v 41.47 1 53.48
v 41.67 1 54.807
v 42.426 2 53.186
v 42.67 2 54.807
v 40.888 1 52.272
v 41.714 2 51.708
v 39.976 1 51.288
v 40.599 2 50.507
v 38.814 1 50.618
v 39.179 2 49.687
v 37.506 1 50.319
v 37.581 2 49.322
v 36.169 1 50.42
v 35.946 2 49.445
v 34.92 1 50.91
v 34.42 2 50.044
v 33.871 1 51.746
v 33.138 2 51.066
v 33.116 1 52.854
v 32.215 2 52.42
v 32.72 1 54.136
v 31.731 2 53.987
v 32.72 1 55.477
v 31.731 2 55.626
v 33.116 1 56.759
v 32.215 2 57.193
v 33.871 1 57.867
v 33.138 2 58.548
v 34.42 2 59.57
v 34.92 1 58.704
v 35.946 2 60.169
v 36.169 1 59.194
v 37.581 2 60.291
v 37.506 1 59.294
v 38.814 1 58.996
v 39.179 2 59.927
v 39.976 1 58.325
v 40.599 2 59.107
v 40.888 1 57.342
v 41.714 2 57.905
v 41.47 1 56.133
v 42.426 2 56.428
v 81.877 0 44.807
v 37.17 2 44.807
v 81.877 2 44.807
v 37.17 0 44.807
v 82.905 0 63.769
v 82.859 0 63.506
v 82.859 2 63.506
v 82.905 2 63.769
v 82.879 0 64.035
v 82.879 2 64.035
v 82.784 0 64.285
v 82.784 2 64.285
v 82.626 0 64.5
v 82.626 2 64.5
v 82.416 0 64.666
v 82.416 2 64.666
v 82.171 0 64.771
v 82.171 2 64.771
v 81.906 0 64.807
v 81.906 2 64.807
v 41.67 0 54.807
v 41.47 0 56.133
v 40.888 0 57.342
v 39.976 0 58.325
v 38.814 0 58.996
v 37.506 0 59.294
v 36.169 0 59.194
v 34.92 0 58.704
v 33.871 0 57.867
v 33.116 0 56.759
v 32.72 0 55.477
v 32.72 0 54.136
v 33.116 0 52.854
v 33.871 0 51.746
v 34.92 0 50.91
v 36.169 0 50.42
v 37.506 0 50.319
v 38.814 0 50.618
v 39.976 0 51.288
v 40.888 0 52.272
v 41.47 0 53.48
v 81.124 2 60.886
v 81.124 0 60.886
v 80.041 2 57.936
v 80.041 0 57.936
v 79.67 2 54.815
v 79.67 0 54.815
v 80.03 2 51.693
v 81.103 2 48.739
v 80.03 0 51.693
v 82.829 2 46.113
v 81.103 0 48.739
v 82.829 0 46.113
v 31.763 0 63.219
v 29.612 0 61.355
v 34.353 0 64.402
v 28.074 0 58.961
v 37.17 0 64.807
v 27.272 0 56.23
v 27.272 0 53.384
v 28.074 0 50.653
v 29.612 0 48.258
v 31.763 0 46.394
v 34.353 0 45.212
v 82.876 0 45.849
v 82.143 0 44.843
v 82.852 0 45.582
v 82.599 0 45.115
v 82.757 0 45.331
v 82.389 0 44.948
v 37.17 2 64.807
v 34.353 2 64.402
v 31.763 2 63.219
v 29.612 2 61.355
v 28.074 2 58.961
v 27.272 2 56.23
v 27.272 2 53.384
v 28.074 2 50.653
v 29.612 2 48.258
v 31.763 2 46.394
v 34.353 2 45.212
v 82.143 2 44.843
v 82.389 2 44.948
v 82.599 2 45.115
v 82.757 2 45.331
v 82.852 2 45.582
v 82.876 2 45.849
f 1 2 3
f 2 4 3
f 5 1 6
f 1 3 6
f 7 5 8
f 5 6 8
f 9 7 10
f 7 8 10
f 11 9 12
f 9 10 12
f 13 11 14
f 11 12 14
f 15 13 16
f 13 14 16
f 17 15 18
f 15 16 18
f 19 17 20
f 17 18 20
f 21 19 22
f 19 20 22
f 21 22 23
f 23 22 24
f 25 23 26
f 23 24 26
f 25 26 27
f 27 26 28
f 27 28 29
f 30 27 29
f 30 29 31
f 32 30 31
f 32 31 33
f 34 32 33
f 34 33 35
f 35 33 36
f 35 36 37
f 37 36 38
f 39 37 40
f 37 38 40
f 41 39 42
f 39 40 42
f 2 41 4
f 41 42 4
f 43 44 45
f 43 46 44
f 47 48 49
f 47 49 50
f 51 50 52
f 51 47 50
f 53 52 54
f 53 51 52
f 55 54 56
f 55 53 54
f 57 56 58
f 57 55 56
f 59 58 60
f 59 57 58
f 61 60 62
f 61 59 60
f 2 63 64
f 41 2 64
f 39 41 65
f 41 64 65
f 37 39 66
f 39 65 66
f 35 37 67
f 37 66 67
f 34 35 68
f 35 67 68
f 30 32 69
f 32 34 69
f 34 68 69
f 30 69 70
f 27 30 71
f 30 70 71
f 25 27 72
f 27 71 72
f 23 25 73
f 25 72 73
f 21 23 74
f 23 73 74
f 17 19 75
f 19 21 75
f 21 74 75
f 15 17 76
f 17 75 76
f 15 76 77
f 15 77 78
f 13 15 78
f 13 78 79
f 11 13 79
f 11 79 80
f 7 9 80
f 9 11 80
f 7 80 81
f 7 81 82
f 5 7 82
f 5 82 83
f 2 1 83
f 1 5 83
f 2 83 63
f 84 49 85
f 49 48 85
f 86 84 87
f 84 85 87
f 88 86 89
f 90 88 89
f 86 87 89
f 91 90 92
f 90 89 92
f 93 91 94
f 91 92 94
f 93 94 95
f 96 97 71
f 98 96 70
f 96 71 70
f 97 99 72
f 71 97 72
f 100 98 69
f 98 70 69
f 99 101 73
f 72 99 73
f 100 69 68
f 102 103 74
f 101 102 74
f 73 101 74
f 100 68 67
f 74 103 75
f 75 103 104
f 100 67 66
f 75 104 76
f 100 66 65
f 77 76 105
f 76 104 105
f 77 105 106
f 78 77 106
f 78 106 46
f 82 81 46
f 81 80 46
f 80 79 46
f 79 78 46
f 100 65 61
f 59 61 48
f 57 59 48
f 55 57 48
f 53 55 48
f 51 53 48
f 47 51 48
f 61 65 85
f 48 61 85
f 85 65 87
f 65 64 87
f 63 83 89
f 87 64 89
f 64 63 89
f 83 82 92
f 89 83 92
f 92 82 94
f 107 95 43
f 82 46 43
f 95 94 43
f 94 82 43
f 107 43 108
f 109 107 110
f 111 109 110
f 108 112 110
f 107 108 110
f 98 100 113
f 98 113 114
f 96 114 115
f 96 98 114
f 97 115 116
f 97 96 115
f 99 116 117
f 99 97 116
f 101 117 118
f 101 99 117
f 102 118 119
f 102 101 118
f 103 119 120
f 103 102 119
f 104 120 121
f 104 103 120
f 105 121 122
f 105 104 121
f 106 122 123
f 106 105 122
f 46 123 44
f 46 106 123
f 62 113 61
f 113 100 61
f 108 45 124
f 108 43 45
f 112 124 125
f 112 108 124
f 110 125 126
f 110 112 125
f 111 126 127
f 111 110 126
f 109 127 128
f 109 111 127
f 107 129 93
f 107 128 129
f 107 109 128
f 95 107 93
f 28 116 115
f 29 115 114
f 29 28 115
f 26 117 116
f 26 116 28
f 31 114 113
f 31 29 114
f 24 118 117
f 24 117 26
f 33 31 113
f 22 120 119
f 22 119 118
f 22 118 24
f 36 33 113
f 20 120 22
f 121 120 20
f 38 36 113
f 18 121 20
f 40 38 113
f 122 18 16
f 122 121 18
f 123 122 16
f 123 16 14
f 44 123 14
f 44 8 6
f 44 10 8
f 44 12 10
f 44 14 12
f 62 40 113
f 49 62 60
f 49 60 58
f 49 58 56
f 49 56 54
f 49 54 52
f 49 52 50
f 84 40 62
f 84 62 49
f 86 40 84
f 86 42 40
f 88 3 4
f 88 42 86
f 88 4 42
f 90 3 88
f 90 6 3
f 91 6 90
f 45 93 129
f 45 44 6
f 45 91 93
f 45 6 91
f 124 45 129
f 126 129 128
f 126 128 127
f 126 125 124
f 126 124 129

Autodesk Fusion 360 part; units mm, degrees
sketch "Sketch1" plane through (0, 0, 0) normal (0, 1, 0) x (1, 0, 0)
  line L0 (17.4087, -54.8067) -> (135.0065, -54.8067) construction
  circle A0 centre (37.1699, -54.8067) radius 10
  line L1 (9.2396, -44.8067) -> (81.8771, -44.8067) construction
  line L2 (13.4192, -64.8067) -> (138.6161, -64.8067) construction
  circle A1 centre (37.1699, -54.8067) radius 4.5
  circle A2 centre (37.1699, -54.8067) radius 7.5 construction
  line L3 (44.6699, -37.6811) -> (44.6699, -71.7825) construction
  line L4 (46.6699, -36.8465) -> (46.6699, -73.6307) construction
  line L5 (79.6699, -35.9522) -> (79.6699, -73.0345) construction
  line L6 (93.1699, -35.833) -> (93.1699, -73.7499) construction
  circle A3 centre (93.1699, -54.7914) radius 13.5
  line L7 (37.1699, -44.8067) -> (84.084, -44.8067)
  line L8 (37.1699, -64.8067) -> (81.9057, -64.8067)
  line L9 (82.084, -39.2431) -> (82.084, -68.9507) construction
  line L10 (82.6289, -46.466) -> (82.084, -47.0874)
  line L11 (82.6565, -63.1461) -> (82.084, -62.4955)
  arc A4 (82.6289, -46.466) -> (81.8771, -44.8067) centre (81.8771, -45.8067) ccw
  arc A5 (81.9057, -64.8067) -> (82.6565, -63.1461) centre (81.9057, -63.8067) ccw
  dimension "d1" = 20
  dimension "d2" = 9
  dimension "d3" = 15
  dimension "d4" = 2
  dimension "d5" = 33
  dimension "d6" = 13.5
  dimension "d7" = 27
  dimension "d8" = 2
  dimension "d9" = 1
  dimension "d10" = 1
extrude "Extrude1" add sketch "Sketch1" along normal blind 2 contours A0 | A0 A3 L7 L8 A4 A5
chamfer "Chamfer1" distance 1 angle 45 1 edges at (32.9745, 2, 53.1794)
equation "d6 = ( 27 / 2 ) * 1 mm"
